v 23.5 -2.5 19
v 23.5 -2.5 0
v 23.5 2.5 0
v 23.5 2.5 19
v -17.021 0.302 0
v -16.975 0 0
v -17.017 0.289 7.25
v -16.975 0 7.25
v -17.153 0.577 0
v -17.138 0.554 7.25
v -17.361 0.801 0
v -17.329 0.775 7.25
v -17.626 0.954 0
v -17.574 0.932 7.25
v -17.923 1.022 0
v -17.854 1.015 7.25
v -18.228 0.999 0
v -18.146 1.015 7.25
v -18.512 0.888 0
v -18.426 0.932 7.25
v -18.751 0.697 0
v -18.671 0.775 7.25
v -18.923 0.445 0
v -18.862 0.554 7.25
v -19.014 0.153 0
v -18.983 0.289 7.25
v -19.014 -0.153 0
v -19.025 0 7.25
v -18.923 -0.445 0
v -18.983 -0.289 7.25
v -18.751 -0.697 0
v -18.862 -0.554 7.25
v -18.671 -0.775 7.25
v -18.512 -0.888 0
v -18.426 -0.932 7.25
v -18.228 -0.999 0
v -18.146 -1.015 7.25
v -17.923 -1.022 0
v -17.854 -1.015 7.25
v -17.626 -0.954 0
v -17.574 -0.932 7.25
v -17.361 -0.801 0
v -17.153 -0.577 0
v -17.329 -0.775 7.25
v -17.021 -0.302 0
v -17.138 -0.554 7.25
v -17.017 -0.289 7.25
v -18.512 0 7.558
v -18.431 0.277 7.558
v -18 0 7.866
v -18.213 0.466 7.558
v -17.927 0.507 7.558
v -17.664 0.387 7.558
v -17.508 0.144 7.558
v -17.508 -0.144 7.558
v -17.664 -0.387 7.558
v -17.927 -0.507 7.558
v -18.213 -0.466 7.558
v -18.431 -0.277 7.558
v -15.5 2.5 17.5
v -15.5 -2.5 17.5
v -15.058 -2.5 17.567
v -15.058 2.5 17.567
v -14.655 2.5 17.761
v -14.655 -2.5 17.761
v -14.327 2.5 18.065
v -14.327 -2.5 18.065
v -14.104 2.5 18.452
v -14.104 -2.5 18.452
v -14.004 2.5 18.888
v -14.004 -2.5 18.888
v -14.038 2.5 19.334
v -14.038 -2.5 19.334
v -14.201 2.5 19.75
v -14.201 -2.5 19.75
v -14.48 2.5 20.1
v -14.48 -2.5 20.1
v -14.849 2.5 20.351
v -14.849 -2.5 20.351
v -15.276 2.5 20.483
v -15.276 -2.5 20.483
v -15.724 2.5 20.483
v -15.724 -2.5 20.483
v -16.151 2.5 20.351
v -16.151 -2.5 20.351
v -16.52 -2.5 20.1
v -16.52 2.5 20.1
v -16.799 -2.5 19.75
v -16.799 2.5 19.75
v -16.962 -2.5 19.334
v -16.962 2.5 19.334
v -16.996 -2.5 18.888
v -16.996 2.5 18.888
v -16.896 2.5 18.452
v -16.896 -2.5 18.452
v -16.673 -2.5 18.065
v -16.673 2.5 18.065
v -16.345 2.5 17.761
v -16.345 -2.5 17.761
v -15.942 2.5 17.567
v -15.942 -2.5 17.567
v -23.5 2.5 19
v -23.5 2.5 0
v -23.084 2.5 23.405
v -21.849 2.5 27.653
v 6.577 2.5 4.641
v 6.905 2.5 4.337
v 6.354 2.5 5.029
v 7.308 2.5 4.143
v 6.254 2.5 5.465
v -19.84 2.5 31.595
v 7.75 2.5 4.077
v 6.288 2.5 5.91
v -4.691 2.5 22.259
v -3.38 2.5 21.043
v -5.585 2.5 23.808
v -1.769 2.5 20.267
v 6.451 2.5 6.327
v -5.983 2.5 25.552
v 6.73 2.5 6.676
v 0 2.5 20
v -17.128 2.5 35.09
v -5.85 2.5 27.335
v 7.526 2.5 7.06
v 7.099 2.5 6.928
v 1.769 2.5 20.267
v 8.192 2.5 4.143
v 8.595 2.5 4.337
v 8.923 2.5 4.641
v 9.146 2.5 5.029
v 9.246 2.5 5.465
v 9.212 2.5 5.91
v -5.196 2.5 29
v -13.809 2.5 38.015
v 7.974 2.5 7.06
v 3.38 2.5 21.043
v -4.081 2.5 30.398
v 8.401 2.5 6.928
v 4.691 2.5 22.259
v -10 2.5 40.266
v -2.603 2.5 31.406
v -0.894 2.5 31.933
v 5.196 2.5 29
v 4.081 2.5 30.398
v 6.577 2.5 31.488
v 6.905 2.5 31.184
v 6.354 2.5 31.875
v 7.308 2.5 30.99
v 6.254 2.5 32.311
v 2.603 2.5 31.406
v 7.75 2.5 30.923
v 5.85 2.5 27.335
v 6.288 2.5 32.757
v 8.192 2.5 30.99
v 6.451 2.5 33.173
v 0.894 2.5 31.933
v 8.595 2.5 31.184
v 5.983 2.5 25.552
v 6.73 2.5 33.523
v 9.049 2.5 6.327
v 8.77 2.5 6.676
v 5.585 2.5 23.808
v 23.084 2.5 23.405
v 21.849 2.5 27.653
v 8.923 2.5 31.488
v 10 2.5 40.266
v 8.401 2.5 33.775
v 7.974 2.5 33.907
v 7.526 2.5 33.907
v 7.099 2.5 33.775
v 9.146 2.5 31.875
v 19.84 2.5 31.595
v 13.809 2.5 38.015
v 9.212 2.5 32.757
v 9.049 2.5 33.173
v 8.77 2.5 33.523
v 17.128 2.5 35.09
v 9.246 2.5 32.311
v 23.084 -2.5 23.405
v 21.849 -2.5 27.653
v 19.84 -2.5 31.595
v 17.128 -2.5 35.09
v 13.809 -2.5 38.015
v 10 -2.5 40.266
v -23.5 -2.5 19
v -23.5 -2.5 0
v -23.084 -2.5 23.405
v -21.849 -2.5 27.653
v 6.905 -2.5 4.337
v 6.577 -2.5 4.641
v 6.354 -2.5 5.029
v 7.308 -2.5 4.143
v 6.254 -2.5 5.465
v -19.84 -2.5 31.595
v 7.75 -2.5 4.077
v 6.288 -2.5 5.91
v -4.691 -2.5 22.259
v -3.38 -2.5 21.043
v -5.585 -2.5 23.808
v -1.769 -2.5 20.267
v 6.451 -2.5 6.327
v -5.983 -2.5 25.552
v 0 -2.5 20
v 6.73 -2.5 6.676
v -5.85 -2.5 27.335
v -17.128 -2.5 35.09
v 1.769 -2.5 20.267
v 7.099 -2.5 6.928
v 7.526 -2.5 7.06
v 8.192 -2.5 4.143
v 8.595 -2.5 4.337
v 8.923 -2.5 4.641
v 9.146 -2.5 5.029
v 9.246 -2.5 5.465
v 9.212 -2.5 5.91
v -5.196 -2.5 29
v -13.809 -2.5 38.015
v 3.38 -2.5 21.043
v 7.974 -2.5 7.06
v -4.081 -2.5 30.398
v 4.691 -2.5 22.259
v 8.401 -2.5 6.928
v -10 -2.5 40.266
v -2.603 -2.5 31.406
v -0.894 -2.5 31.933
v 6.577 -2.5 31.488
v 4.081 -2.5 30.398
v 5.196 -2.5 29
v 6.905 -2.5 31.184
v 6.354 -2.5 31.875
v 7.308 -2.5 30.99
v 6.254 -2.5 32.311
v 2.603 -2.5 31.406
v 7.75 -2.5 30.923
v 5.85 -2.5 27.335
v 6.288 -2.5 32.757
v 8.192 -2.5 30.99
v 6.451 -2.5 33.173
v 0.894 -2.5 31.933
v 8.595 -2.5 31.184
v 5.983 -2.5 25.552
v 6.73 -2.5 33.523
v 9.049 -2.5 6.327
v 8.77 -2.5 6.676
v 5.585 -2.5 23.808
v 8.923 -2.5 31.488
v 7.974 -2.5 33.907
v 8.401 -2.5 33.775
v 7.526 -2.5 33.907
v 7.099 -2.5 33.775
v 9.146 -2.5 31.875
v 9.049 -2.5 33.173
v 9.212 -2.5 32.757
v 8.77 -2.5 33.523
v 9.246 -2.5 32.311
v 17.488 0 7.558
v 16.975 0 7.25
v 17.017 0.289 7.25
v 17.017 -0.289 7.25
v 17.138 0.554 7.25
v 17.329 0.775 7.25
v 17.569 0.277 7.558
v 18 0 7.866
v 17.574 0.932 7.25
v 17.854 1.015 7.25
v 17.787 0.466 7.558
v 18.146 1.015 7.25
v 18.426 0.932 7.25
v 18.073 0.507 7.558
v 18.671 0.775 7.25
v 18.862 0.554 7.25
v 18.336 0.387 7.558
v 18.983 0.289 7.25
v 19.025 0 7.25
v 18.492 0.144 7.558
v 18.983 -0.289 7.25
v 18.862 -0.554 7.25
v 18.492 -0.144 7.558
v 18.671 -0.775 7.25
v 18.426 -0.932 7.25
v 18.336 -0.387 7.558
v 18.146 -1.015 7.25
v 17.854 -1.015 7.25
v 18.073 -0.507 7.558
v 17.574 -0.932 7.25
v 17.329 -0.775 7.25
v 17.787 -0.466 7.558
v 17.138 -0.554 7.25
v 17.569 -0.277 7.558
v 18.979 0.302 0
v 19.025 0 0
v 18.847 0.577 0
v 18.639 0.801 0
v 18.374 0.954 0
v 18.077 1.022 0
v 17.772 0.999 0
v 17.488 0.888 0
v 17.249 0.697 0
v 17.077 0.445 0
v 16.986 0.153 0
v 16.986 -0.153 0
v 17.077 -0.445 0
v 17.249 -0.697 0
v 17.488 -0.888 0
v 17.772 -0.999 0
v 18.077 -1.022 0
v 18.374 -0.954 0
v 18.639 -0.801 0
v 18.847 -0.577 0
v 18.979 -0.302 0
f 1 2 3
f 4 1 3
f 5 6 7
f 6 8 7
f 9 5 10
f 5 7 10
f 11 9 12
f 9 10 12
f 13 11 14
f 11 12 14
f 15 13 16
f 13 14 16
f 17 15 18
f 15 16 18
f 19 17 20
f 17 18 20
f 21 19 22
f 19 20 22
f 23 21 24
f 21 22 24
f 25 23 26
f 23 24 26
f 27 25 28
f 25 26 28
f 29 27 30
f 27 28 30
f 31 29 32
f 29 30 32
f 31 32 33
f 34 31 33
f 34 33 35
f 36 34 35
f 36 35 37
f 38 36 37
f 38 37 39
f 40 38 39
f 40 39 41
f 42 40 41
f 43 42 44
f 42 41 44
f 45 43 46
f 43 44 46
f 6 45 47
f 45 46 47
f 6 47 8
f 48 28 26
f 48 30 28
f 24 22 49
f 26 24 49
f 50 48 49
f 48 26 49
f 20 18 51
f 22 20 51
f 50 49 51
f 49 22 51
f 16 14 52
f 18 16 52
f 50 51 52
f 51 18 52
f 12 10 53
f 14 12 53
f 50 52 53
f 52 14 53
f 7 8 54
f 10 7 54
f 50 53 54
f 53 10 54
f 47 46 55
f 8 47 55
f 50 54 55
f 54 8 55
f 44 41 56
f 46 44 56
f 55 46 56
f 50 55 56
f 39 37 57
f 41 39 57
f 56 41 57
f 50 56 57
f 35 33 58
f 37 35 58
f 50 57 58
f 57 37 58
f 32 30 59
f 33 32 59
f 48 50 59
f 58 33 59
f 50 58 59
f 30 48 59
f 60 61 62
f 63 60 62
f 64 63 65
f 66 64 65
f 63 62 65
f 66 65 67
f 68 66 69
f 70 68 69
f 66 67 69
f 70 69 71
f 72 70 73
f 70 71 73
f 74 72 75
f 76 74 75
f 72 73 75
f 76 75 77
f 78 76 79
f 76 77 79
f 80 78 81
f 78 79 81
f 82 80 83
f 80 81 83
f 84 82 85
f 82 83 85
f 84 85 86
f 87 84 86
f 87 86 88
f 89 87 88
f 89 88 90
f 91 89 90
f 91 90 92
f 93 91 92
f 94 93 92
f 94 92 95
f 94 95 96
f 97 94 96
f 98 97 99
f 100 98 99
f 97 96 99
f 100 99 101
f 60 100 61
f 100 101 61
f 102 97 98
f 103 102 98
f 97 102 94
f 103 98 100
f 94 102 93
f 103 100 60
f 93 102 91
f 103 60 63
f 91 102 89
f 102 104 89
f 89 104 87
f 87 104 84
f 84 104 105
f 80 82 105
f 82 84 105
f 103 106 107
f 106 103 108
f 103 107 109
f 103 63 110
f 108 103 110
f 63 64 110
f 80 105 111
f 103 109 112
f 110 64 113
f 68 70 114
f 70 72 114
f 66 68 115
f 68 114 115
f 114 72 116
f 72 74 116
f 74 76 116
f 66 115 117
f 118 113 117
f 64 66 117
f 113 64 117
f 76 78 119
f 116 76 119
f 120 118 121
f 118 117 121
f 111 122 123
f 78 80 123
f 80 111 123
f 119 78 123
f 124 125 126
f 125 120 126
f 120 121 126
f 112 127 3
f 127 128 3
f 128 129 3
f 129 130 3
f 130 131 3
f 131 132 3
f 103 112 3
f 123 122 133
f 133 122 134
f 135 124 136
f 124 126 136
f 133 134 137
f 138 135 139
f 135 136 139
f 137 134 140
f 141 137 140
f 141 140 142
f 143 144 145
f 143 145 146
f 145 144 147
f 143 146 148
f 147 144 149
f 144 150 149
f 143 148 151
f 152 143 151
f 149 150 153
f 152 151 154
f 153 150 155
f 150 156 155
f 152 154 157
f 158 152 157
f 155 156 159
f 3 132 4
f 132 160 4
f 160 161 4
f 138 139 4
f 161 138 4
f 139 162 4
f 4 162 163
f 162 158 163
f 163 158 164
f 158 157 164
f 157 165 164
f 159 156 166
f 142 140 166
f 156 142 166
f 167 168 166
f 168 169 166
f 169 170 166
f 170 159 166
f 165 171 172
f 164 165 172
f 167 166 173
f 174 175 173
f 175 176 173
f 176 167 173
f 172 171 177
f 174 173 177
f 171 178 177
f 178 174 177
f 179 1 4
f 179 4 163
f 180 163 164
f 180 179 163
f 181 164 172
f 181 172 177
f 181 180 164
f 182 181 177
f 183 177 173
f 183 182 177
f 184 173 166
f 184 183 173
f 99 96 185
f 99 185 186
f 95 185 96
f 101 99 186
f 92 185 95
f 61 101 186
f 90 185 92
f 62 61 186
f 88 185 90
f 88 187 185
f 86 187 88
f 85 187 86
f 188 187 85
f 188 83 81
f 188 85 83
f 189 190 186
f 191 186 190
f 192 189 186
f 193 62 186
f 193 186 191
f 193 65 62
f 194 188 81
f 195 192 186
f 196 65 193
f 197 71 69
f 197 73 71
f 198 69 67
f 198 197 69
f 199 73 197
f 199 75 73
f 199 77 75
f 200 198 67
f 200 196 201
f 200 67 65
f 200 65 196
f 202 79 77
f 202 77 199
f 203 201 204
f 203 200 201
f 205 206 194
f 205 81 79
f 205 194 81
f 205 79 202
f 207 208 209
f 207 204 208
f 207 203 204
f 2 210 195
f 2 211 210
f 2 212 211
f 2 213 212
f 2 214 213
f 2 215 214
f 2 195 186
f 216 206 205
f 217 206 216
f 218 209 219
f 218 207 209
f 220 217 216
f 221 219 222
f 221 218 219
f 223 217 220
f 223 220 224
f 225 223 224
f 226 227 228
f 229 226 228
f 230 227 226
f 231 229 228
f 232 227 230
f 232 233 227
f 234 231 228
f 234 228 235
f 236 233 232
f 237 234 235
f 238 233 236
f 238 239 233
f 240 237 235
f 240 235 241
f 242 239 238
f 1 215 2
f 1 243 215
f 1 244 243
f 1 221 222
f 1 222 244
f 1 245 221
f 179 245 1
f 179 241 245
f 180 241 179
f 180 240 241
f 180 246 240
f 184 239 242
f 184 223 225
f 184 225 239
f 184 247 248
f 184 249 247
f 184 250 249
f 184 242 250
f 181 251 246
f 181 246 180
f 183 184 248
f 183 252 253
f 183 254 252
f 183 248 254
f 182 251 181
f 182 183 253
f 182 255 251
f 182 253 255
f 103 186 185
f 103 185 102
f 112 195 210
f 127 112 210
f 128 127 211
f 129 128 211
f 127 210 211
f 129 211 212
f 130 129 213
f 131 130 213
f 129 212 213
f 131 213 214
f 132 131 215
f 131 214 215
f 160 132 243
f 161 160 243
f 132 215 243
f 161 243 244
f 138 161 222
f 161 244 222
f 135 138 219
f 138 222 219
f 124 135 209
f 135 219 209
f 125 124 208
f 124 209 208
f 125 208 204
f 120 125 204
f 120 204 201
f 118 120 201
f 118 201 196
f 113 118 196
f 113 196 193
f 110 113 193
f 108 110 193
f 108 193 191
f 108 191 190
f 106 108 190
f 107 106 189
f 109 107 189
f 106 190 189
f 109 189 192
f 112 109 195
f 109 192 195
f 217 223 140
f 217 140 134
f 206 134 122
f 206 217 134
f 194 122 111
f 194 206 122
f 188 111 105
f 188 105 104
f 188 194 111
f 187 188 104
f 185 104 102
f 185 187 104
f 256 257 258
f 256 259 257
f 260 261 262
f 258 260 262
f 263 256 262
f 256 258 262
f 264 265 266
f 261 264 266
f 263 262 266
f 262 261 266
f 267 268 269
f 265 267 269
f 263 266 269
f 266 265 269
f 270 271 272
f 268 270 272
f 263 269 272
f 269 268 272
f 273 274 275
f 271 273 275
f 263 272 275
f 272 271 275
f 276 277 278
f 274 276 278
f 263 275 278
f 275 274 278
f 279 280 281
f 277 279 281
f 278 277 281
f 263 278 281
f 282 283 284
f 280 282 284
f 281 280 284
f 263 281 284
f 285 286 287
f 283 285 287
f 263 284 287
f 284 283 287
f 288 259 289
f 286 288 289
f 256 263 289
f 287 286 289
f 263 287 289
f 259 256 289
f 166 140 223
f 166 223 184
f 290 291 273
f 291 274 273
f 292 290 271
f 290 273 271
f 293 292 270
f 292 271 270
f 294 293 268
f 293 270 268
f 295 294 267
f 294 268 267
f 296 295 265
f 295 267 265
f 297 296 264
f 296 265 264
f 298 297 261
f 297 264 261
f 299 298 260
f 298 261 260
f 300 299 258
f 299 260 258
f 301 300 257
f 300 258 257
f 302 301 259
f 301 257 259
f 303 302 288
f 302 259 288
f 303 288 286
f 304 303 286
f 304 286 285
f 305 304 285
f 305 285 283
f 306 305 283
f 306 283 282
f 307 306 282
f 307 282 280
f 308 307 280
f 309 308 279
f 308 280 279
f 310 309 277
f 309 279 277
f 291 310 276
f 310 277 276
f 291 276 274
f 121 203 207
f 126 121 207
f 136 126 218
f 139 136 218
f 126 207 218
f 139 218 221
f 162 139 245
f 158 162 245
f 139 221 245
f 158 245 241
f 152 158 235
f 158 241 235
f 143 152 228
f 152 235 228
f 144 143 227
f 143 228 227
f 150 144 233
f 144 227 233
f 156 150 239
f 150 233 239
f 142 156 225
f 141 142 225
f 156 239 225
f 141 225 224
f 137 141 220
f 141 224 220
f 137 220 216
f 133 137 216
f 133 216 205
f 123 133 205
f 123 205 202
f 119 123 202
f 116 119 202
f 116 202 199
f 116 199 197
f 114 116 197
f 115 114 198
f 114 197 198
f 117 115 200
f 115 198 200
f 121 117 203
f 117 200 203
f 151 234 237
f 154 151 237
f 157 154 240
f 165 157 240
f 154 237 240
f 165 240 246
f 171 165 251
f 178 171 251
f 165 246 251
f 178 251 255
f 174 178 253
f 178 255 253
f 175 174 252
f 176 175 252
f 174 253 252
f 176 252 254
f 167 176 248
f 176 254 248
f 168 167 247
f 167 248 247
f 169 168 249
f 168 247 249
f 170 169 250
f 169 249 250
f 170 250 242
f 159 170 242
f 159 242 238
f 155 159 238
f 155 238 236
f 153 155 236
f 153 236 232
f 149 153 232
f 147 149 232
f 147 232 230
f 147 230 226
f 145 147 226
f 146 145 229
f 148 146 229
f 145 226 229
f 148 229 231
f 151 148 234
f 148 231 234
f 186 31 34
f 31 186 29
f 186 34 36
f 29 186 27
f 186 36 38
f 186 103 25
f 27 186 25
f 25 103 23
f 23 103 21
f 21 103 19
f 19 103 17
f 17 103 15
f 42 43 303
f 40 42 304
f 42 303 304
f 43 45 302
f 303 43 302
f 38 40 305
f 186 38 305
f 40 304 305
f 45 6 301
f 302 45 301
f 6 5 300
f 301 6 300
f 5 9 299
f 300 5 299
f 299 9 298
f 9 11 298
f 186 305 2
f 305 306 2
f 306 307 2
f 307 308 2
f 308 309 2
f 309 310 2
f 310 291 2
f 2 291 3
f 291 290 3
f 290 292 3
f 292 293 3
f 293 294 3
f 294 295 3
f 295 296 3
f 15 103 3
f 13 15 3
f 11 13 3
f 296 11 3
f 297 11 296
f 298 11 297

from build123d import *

# Parameters (mm, degrees)
SKETCH_1_W          = 47
SKETCH_1_H          = 5
EXTRUDE_1_DEPTH     = 19
SKETCH_2_R          = 23.5
EXTRUDE_2_DEPTH     = 5
SKETCH_3_R          = 6
SKETCH_3_R_2        = 1.5
CUT_EXTRUDE_1_DEPTH = 5
M2_5X0_45_1_D       = 2.05
M2_5X0_45_1_DEPTH   = 7.25
M2_5X0_45_1_TIP     = 0.615882135
CUT_EXTRUDE_2_DEPTH = 5
CUT_EXTRUDE_3_DEPTH = 5


with BuildPart() as part:
    # ｽｹｯﾁ1 → ﾎﾞｽ - 押し出し1 (new body)
    with BuildSketch(Plane.XY):
        Rectangle(SKETCH_1_W, SKETCH_1_H)
    extrude(amount=EXTRUDE_1_DEPTH)

    # ｽｹｯﾁ2 → ﾎﾞｽ - 押し出し2 (add)
    with BuildSketch(Plane.XZ.offset(2.5)):
        with Locations((0, 19)):
            Circle(SKETCH_2_R)
    extrude(amount=-EXTRUDE_2_DEPTH)

    # ｽｹｯﾁ3 → ｶｯﾄ - 押し出し1 (cut)
    with BuildSketch(Plane.XZ.offset(2.5)):
        with Locations(Location((0, 26, 0), (0, 0, 270))):  # turned: the seam where the file's is
            Circle(SKETCH_3_R)
        with Locations(Location((-15.5, 19, 0), (0, 0, 270))):  # turned: the seam where the file's is
            Circle(SKETCH_3_R_2)
        with Locations(Location((7.75, 5.576606241, 0), (0, 0, 270))):  # turned: the seam where the file's is
            Circle(SKETCH_3_R_2)
        with Locations(Location((7.75, 32.423393759, 0), (0, 0, 270))):  # turned: the seam where the file's is
            Circle(SKETCH_3_R_2)
    extrude(amount=-CUT_EXTRUDE_1_DEPTH, mode=Mode.SUBTRACT)

    # M2.5x0.45 ねじ穴1
    with Locations(Plane(origin=(0, 0, 0), x_dir=(-1, 0, 0), z_dir=(0, 0, -1))):
        with Locations((18, 0), (-18, 0)):
            Hole(M2_5X0_45_1_D / 2, depth=M2_5X0_45_1_DEPTH)
            with Locations((0, 0, -(M2_5X0_45_1_DEPTH + M2_5X0_45_1_TIP / 2))):  # 118° drill point
                Cone(0, M2_5X0_45_1_D / 2, M2_5X0_45_1_TIP, mode=Mode.SUBTRACT)

    # ｽｹｯﾁ8 → ｶｯﾄ - 押し出し2 (cut)
    with BuildSketch(Plane(origin=(0, 2.5, 0), x_dir=(1, 0, 0), z_dir=(0, 1, 0))):
        with BuildLine():
            Line((-13.829316686, 0), (13.829316686, 0))
            ThreePointArc((13.829316686, 0), (0, 4.5), (-13.829316686, 0))
        make_face()
    extrude(amount=-CUT_EXTRUDE_2_DEPTH, mode=Mode.SUBTRACT)

    # ｽｹｯﾁ9 → ｶｯﾄ - 押し出し3 (cut)
    with BuildSketch(Plane(origin=(0, 2.5, 0), x_dir=(1, 0, 0), z_dir=(0, 1, 0))):
        with BuildLine():
            Line((-10, -40.266170318), (10, -40.266170318))
            ThreePointArc((10, -40.266170318), (0, -42.5), (-10, -40.266170318))
        make_face()
    extrude(amount=-CUT_EXTRUDE_3_DEPTH, mode=Mode.SUBTRACT)


solid = part.part
